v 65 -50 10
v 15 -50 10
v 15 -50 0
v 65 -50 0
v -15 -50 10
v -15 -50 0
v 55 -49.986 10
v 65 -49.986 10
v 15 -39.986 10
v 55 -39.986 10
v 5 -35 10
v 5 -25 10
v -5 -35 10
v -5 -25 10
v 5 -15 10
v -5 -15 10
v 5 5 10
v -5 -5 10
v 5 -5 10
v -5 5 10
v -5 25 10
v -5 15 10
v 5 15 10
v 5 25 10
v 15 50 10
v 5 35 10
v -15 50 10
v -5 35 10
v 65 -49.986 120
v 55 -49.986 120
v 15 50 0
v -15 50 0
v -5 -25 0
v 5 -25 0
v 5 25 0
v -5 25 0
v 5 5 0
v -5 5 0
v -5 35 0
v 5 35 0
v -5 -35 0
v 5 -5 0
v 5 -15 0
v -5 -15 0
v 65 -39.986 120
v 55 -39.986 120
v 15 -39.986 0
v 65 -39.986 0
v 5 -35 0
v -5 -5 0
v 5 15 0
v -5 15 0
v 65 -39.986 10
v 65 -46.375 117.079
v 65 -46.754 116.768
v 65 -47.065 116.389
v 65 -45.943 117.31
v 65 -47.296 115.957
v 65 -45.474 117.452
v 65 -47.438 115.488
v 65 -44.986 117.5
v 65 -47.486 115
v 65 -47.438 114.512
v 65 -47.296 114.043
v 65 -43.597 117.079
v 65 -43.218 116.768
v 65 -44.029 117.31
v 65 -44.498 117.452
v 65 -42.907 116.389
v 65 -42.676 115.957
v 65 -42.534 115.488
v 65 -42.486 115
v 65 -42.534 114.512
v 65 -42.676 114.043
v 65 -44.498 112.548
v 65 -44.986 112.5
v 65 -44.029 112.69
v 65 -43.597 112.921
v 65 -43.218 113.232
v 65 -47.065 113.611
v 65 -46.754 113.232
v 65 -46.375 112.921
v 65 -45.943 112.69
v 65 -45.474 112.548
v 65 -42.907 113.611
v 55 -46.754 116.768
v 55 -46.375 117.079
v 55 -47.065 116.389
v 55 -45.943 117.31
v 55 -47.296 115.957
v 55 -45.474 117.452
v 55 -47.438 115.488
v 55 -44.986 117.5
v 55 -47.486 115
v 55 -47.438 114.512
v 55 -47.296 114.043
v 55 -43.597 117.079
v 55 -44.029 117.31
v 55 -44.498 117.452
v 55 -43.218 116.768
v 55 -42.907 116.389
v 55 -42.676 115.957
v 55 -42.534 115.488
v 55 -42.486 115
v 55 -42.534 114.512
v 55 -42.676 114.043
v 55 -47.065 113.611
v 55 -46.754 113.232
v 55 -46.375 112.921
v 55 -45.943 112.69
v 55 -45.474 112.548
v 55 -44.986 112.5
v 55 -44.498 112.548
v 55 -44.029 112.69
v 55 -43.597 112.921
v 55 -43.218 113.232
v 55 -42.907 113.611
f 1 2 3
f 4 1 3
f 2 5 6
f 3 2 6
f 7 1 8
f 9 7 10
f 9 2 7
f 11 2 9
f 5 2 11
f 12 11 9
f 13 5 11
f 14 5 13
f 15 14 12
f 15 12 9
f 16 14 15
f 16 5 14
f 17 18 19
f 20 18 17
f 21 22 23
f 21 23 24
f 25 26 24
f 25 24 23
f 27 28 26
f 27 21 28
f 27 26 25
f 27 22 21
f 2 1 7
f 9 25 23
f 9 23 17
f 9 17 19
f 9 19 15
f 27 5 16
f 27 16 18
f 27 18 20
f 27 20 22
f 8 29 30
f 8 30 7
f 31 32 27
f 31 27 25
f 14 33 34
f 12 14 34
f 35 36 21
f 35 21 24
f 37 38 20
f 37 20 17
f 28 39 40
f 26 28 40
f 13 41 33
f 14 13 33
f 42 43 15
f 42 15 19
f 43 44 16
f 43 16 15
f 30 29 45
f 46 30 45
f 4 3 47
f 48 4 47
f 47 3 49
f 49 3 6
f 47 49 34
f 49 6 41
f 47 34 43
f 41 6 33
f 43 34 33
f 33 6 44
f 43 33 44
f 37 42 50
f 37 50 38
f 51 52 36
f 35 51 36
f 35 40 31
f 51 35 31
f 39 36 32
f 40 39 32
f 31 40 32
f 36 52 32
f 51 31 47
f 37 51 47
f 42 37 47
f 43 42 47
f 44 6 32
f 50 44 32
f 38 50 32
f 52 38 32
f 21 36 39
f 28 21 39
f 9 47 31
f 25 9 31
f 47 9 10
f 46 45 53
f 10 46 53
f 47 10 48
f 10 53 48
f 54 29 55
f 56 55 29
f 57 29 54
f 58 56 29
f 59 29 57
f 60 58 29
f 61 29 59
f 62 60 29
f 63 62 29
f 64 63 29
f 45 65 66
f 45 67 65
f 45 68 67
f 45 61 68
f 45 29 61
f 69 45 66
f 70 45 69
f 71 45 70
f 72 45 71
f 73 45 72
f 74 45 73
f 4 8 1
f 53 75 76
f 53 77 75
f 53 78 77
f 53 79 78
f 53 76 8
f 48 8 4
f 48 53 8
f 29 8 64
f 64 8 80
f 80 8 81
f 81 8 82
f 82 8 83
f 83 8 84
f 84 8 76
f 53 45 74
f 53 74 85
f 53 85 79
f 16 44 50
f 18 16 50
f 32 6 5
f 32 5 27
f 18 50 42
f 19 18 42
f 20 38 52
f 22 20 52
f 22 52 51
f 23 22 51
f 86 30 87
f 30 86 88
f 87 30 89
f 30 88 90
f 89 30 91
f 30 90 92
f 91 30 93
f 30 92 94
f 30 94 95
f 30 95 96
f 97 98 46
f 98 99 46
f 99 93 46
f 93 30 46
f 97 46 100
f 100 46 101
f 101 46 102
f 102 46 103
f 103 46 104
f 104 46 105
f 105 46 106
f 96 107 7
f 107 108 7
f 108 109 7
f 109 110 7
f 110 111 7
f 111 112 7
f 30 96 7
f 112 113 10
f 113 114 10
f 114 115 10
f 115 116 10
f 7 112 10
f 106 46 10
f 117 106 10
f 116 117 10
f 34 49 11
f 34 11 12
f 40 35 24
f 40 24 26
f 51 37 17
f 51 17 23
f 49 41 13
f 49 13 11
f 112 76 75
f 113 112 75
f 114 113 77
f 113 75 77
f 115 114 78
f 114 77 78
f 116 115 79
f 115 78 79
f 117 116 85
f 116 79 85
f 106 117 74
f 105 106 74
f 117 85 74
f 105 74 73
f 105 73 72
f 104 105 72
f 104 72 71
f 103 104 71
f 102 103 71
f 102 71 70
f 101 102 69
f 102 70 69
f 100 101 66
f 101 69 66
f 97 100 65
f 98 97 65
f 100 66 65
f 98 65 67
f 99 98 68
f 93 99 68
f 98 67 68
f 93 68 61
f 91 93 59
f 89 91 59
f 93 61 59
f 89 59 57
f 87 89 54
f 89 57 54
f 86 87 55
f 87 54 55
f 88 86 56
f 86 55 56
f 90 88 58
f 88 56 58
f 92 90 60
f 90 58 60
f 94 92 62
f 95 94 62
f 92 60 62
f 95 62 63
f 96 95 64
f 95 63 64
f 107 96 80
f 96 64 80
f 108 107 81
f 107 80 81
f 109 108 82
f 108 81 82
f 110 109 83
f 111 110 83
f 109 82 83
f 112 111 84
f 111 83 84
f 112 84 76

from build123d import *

# Parameters (mm, degrees)
SKETCH_1_W      = 30
SKETCH_1_H      = 100
SKETCH_1_W_2    = 10
SKETCH_1_H_2    = 10
EXTRUDE_1_DEPTH = 10
SKETCH_2_W      = 10
SKETCH_2_H      = 10.013991437
EXTRUDE_2_DEPTH = 50
SKETCH_3_W      = 120
SKETCH_3_H      = 10
SKETCH_3_R      = 2.5
EXTRUDE_3_DEPTH = 10


with BuildPart() as part:
    # 스케치1 → 보스-돌출1 (new body)
    with BuildSketch(Plane.XY):
        Rectangle(SKETCH_1_W, SKETCH_1_H)
        with Locations((0, 10)):
            Rectangle(SKETCH_1_W_2, SKETCH_1_H_2, mode=Mode.SUBTRACT)
        with Locations((0, 30)):
            Rectangle(SKETCH_1_W_2, SKETCH_1_H_2, mode=Mode.SUBTRACT)
        with Locations((0, -10)):
            Rectangle(SKETCH_1_W_2, SKETCH_1_H_2, mode=Mode.SUBTRACT)
        with Locations((0, -30)):
            Rectangle(SKETCH_1_W_2, SKETCH_1_H_2, mode=Mode.SUBTRACT)
    extrude(amount=EXTRUDE_1_DEPTH)

    # 스케치2 → 보스-돌출2 (add)
    with BuildSketch(Plane(origin=(15, 0, 0), x_dir=(0, 0, -1), z_dir=(1, 0, 0))):
        with Locations((-5, -44.993004282)):
            Rectangle(SKETCH_2_W, SKETCH_2_H)
    extrude(amount=EXTRUDE_2_DEPTH)

    # 스케치3 → 보스-돌출3 (add)
    with BuildSketch(Plane(origin=(65, 0, 0), x_dir=(0, 0, -1), z_dir=(1, 0, 0))):
        with Locations((-60, -44.986008563)):
            Rectangle(SKETCH_3_W, SKETCH_3_H)
        with Locations((-115, -44.986008563)):
            Circle(SKETCH_3_R, mode=Mode.SUBTRACT)
    extrude(amount=-EXTRUDE_3_DEPTH)


solid = part.part
